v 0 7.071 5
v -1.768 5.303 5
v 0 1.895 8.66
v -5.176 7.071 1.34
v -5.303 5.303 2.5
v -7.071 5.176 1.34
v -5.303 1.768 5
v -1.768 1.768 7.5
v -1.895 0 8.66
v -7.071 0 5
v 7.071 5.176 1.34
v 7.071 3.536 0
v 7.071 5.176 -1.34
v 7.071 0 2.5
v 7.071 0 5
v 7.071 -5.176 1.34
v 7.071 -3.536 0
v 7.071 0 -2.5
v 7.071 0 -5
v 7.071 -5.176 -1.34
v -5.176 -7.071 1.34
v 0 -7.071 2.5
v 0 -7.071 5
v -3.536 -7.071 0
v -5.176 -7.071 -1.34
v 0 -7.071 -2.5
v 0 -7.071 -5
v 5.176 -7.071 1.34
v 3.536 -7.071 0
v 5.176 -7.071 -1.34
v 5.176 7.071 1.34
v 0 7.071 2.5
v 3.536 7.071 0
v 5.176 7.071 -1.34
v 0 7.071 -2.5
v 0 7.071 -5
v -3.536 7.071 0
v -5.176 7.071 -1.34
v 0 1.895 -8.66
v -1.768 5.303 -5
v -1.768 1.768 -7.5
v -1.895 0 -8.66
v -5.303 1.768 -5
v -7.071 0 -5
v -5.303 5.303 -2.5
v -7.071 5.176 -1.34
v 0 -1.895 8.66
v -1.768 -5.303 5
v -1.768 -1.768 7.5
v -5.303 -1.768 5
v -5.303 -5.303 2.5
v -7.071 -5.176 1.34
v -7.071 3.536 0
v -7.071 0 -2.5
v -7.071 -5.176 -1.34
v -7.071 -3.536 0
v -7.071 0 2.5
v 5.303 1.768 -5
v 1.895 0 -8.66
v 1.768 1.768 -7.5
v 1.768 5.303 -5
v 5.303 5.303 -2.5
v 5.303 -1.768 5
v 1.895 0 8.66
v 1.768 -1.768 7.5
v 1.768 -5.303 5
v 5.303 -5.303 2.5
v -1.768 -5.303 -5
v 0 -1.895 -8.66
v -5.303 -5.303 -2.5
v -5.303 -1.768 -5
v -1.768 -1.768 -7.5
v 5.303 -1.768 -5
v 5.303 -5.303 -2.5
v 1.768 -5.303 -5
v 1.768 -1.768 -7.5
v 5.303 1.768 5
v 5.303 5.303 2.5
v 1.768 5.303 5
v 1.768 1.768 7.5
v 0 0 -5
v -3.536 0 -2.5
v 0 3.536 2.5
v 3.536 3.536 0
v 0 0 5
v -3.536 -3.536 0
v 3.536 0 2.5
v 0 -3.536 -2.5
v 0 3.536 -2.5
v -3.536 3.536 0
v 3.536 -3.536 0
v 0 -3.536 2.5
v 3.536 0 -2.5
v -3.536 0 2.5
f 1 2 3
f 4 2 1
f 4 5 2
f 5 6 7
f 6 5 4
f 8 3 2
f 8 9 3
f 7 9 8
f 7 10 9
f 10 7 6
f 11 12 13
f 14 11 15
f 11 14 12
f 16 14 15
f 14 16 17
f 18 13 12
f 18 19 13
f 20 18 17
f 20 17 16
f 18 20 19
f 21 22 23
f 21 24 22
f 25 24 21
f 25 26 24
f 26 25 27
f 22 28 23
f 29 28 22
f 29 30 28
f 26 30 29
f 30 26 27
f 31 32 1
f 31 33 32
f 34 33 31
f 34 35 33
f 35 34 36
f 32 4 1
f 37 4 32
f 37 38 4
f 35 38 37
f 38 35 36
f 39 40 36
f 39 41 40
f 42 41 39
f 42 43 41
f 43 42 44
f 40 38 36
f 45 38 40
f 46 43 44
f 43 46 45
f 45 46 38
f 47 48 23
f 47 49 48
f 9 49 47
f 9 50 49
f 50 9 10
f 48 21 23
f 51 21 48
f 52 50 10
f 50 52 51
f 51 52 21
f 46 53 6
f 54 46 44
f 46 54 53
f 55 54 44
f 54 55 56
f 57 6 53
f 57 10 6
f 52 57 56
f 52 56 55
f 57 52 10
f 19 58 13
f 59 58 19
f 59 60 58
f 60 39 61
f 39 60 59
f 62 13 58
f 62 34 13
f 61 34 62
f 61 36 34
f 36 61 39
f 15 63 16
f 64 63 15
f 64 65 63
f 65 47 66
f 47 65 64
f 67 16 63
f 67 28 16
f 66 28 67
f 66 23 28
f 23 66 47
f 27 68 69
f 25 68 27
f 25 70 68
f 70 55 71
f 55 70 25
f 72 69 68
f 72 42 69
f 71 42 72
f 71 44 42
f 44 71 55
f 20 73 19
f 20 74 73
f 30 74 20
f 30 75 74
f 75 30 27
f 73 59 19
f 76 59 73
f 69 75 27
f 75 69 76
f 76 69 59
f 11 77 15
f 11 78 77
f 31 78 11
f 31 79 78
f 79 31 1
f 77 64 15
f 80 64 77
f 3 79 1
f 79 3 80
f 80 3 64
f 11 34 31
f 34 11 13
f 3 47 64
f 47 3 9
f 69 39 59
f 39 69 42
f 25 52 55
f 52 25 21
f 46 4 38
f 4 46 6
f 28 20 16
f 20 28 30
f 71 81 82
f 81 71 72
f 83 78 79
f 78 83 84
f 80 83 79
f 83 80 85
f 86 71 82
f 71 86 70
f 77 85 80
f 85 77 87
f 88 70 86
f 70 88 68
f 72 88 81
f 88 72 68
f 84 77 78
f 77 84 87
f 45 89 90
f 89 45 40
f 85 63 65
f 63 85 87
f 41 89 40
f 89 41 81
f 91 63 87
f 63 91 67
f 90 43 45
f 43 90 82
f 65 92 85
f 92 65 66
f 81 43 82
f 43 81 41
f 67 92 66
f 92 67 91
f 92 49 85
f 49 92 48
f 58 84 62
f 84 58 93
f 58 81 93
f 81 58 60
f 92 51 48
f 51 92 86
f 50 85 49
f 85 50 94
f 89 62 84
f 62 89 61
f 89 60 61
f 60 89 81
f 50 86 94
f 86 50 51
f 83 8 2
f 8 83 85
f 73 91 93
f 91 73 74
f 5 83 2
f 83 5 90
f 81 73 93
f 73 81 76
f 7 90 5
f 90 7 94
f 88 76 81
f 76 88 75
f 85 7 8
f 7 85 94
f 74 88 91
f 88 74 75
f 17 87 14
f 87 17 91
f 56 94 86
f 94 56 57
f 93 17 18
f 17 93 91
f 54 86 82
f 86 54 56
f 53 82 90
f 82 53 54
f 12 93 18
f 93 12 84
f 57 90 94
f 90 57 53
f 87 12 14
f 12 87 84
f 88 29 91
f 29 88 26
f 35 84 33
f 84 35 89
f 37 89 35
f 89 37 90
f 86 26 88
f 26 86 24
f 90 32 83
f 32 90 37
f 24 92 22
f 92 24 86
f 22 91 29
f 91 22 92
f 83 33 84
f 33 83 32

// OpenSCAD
// --- BUILD TYPE ---

NODE = 1;
MULTINODE = !1;
LEG = !1;

// --- CONFIG ---

LEG_LENGTH = 50;
NODE_DIAMETER = 20;
MULTINODE_X = 4;
MULTINODE_Y = 4;

// Don't change these

hd = NODE_DIAMETER / 8;
ld = NODE_DIAMETER / 4;

hd1 = hd * sqrt(2);
hd2 = hd;
ld1 = ld * sqrt(2);
ld2 = ld;

inrad = NODE_DIAMETER / 2 / sqrt(2);

truncate_tip = 1;

// --- DRAW ---

if (LEG) {
  draw_leg();
}

if (NODE) {
  draw_node();
}

if (MULTINODE) {
  for (i = [0:MULTINODE_X - 1]) for (j=[0:MULTINODE_Y - 1]) {
    translate([i, j, 0] * (NODE_DIAMETER * sqrt(2) / 2 + 0.5))
    draw_node();
  }
}

// --- VECTOR CONSTANTS ---

cv = [
  [-1,-1,-1], // 00
  [-1,-1, 1], // 01
  [-1, 1,-1], // 02
  [-1, 1, 1], // 03
  [ 1,-1,-1], // 04
  [ 1,-1, 1], // 05
  [ 1, 1,-1], // 06
  [ 1, 1, 1], // 07
  
  [ 0, 0,-2], // 08
  [ 0, 0, 2], // 09
  [ 0,-2, 0], // 10
  [ 0, 2, 0], // 11
  [-2, 0, 0], // 12
  [ 2, 0, 0], // 13
];

cf = [
  [ 3,11, 7, 9],
  [ 7,11, 6,13],
  [ 6,11, 2, 8],
  [ 2,11, 3,12],
  [ 5,10, 1, 9],
  [ 1,10, 0,12],
  [ 0,10, 4, 8],
  [ 4,10, 5,13],
  
  [ 8, 2,12, 0],
  [12, 3, 9, 1],
  [ 9, 7,13, 5],
  [13, 6, 8, 4],
];

tv = [
  [0, 0, 0],
  [2, 0, 0],
  [1, 1, 1],
  [0, 2, 0],
  [1, 1,-1]
];

tf = [
  [0, 2, 1],
  [0, 3, 2],
  [0, 4, 3],
  [0, 1, 4],
  [1, 2, 3, 4]
];

// --- STUFF ---

module hole(s=1, rot=false) {
  lv = [
    [hd1, 0],
    [0, hd2],
    [-hd1, 0],
    [0, -hd2]
  ];
  rotV = rot ? [0, 0, 90] : [0, 0, 0];
  rotate(rotV)
    linear_extrude(height=NODE_DIAMETER*2, center=true)
    polygon(lv*s);
}

module holes(s=1) {
  rotate([0,45,0]) hole(s);
  rotate([45,0,0]) hole(s, 1);
  rotate([0,-45,0]) hole(s);
  rotate([-45,0,0]) hole(s, 1);
  rotate([90,0,45]) hole(s);
  rotate([0,90,45]) hole(s, 1);
}

module nodehull() {
  intersection() {
    polyhedron(cv * NODE_DIAMETER / 4, cf);
    cube([1,1,1] * NODE_DIAMETER * sqrt(3) / 2, center=true);
  }
}

module leg_extrudable(s=1) {
  ld1Vec = [ld1, 0];
  ld2Vec = [0, ld2];
  lv = [
    (ld1Vec + ld2Vec) / 2,
    ld2Vec,
    (-ld1Vec + ld2Vec) / 2,
    (-ld1Vec - ld2Vec) / 2,
    -ld2Vec,
    (ld1Vec - ld2Vec) / 2,
  ];
  polygon(lv * s);
}

module leg_end() {
  intersection() {
    rotate([-90, 0, 0])
    rotate([0, 0, 45])
    polyhedron(tv * ld / 2, tf);
    translate([0, 0, -10 - truncate_tip])
    linear_extrude(20, center=true)
    leg_extrudable(0.5);
  }
}

module draw_node() {
  rotate([0, 0, 45])
  difference() {
    nodehull();
    holes();
  }
}

module draw_leg() {
  l1 = LEG_LENGTH - inrad;
  l2 = LEG_LENGTH - inrad * 2;
  rotate([0, 90, 0])
  rotate([90, 0, 0]) {
    linear_extrude(height=l2, center=true)
    leg_extrudable(0.75);
    hull() {
      linear_extrude(height=l1, center=true)
      leg_extrudable(0.5);
      for (i = [0:1])
        rotate([180 * i, 0 ,0])
        translate([0, 0, LEG_LENGTH / 2])
        leg_end();
    }
  }
}
